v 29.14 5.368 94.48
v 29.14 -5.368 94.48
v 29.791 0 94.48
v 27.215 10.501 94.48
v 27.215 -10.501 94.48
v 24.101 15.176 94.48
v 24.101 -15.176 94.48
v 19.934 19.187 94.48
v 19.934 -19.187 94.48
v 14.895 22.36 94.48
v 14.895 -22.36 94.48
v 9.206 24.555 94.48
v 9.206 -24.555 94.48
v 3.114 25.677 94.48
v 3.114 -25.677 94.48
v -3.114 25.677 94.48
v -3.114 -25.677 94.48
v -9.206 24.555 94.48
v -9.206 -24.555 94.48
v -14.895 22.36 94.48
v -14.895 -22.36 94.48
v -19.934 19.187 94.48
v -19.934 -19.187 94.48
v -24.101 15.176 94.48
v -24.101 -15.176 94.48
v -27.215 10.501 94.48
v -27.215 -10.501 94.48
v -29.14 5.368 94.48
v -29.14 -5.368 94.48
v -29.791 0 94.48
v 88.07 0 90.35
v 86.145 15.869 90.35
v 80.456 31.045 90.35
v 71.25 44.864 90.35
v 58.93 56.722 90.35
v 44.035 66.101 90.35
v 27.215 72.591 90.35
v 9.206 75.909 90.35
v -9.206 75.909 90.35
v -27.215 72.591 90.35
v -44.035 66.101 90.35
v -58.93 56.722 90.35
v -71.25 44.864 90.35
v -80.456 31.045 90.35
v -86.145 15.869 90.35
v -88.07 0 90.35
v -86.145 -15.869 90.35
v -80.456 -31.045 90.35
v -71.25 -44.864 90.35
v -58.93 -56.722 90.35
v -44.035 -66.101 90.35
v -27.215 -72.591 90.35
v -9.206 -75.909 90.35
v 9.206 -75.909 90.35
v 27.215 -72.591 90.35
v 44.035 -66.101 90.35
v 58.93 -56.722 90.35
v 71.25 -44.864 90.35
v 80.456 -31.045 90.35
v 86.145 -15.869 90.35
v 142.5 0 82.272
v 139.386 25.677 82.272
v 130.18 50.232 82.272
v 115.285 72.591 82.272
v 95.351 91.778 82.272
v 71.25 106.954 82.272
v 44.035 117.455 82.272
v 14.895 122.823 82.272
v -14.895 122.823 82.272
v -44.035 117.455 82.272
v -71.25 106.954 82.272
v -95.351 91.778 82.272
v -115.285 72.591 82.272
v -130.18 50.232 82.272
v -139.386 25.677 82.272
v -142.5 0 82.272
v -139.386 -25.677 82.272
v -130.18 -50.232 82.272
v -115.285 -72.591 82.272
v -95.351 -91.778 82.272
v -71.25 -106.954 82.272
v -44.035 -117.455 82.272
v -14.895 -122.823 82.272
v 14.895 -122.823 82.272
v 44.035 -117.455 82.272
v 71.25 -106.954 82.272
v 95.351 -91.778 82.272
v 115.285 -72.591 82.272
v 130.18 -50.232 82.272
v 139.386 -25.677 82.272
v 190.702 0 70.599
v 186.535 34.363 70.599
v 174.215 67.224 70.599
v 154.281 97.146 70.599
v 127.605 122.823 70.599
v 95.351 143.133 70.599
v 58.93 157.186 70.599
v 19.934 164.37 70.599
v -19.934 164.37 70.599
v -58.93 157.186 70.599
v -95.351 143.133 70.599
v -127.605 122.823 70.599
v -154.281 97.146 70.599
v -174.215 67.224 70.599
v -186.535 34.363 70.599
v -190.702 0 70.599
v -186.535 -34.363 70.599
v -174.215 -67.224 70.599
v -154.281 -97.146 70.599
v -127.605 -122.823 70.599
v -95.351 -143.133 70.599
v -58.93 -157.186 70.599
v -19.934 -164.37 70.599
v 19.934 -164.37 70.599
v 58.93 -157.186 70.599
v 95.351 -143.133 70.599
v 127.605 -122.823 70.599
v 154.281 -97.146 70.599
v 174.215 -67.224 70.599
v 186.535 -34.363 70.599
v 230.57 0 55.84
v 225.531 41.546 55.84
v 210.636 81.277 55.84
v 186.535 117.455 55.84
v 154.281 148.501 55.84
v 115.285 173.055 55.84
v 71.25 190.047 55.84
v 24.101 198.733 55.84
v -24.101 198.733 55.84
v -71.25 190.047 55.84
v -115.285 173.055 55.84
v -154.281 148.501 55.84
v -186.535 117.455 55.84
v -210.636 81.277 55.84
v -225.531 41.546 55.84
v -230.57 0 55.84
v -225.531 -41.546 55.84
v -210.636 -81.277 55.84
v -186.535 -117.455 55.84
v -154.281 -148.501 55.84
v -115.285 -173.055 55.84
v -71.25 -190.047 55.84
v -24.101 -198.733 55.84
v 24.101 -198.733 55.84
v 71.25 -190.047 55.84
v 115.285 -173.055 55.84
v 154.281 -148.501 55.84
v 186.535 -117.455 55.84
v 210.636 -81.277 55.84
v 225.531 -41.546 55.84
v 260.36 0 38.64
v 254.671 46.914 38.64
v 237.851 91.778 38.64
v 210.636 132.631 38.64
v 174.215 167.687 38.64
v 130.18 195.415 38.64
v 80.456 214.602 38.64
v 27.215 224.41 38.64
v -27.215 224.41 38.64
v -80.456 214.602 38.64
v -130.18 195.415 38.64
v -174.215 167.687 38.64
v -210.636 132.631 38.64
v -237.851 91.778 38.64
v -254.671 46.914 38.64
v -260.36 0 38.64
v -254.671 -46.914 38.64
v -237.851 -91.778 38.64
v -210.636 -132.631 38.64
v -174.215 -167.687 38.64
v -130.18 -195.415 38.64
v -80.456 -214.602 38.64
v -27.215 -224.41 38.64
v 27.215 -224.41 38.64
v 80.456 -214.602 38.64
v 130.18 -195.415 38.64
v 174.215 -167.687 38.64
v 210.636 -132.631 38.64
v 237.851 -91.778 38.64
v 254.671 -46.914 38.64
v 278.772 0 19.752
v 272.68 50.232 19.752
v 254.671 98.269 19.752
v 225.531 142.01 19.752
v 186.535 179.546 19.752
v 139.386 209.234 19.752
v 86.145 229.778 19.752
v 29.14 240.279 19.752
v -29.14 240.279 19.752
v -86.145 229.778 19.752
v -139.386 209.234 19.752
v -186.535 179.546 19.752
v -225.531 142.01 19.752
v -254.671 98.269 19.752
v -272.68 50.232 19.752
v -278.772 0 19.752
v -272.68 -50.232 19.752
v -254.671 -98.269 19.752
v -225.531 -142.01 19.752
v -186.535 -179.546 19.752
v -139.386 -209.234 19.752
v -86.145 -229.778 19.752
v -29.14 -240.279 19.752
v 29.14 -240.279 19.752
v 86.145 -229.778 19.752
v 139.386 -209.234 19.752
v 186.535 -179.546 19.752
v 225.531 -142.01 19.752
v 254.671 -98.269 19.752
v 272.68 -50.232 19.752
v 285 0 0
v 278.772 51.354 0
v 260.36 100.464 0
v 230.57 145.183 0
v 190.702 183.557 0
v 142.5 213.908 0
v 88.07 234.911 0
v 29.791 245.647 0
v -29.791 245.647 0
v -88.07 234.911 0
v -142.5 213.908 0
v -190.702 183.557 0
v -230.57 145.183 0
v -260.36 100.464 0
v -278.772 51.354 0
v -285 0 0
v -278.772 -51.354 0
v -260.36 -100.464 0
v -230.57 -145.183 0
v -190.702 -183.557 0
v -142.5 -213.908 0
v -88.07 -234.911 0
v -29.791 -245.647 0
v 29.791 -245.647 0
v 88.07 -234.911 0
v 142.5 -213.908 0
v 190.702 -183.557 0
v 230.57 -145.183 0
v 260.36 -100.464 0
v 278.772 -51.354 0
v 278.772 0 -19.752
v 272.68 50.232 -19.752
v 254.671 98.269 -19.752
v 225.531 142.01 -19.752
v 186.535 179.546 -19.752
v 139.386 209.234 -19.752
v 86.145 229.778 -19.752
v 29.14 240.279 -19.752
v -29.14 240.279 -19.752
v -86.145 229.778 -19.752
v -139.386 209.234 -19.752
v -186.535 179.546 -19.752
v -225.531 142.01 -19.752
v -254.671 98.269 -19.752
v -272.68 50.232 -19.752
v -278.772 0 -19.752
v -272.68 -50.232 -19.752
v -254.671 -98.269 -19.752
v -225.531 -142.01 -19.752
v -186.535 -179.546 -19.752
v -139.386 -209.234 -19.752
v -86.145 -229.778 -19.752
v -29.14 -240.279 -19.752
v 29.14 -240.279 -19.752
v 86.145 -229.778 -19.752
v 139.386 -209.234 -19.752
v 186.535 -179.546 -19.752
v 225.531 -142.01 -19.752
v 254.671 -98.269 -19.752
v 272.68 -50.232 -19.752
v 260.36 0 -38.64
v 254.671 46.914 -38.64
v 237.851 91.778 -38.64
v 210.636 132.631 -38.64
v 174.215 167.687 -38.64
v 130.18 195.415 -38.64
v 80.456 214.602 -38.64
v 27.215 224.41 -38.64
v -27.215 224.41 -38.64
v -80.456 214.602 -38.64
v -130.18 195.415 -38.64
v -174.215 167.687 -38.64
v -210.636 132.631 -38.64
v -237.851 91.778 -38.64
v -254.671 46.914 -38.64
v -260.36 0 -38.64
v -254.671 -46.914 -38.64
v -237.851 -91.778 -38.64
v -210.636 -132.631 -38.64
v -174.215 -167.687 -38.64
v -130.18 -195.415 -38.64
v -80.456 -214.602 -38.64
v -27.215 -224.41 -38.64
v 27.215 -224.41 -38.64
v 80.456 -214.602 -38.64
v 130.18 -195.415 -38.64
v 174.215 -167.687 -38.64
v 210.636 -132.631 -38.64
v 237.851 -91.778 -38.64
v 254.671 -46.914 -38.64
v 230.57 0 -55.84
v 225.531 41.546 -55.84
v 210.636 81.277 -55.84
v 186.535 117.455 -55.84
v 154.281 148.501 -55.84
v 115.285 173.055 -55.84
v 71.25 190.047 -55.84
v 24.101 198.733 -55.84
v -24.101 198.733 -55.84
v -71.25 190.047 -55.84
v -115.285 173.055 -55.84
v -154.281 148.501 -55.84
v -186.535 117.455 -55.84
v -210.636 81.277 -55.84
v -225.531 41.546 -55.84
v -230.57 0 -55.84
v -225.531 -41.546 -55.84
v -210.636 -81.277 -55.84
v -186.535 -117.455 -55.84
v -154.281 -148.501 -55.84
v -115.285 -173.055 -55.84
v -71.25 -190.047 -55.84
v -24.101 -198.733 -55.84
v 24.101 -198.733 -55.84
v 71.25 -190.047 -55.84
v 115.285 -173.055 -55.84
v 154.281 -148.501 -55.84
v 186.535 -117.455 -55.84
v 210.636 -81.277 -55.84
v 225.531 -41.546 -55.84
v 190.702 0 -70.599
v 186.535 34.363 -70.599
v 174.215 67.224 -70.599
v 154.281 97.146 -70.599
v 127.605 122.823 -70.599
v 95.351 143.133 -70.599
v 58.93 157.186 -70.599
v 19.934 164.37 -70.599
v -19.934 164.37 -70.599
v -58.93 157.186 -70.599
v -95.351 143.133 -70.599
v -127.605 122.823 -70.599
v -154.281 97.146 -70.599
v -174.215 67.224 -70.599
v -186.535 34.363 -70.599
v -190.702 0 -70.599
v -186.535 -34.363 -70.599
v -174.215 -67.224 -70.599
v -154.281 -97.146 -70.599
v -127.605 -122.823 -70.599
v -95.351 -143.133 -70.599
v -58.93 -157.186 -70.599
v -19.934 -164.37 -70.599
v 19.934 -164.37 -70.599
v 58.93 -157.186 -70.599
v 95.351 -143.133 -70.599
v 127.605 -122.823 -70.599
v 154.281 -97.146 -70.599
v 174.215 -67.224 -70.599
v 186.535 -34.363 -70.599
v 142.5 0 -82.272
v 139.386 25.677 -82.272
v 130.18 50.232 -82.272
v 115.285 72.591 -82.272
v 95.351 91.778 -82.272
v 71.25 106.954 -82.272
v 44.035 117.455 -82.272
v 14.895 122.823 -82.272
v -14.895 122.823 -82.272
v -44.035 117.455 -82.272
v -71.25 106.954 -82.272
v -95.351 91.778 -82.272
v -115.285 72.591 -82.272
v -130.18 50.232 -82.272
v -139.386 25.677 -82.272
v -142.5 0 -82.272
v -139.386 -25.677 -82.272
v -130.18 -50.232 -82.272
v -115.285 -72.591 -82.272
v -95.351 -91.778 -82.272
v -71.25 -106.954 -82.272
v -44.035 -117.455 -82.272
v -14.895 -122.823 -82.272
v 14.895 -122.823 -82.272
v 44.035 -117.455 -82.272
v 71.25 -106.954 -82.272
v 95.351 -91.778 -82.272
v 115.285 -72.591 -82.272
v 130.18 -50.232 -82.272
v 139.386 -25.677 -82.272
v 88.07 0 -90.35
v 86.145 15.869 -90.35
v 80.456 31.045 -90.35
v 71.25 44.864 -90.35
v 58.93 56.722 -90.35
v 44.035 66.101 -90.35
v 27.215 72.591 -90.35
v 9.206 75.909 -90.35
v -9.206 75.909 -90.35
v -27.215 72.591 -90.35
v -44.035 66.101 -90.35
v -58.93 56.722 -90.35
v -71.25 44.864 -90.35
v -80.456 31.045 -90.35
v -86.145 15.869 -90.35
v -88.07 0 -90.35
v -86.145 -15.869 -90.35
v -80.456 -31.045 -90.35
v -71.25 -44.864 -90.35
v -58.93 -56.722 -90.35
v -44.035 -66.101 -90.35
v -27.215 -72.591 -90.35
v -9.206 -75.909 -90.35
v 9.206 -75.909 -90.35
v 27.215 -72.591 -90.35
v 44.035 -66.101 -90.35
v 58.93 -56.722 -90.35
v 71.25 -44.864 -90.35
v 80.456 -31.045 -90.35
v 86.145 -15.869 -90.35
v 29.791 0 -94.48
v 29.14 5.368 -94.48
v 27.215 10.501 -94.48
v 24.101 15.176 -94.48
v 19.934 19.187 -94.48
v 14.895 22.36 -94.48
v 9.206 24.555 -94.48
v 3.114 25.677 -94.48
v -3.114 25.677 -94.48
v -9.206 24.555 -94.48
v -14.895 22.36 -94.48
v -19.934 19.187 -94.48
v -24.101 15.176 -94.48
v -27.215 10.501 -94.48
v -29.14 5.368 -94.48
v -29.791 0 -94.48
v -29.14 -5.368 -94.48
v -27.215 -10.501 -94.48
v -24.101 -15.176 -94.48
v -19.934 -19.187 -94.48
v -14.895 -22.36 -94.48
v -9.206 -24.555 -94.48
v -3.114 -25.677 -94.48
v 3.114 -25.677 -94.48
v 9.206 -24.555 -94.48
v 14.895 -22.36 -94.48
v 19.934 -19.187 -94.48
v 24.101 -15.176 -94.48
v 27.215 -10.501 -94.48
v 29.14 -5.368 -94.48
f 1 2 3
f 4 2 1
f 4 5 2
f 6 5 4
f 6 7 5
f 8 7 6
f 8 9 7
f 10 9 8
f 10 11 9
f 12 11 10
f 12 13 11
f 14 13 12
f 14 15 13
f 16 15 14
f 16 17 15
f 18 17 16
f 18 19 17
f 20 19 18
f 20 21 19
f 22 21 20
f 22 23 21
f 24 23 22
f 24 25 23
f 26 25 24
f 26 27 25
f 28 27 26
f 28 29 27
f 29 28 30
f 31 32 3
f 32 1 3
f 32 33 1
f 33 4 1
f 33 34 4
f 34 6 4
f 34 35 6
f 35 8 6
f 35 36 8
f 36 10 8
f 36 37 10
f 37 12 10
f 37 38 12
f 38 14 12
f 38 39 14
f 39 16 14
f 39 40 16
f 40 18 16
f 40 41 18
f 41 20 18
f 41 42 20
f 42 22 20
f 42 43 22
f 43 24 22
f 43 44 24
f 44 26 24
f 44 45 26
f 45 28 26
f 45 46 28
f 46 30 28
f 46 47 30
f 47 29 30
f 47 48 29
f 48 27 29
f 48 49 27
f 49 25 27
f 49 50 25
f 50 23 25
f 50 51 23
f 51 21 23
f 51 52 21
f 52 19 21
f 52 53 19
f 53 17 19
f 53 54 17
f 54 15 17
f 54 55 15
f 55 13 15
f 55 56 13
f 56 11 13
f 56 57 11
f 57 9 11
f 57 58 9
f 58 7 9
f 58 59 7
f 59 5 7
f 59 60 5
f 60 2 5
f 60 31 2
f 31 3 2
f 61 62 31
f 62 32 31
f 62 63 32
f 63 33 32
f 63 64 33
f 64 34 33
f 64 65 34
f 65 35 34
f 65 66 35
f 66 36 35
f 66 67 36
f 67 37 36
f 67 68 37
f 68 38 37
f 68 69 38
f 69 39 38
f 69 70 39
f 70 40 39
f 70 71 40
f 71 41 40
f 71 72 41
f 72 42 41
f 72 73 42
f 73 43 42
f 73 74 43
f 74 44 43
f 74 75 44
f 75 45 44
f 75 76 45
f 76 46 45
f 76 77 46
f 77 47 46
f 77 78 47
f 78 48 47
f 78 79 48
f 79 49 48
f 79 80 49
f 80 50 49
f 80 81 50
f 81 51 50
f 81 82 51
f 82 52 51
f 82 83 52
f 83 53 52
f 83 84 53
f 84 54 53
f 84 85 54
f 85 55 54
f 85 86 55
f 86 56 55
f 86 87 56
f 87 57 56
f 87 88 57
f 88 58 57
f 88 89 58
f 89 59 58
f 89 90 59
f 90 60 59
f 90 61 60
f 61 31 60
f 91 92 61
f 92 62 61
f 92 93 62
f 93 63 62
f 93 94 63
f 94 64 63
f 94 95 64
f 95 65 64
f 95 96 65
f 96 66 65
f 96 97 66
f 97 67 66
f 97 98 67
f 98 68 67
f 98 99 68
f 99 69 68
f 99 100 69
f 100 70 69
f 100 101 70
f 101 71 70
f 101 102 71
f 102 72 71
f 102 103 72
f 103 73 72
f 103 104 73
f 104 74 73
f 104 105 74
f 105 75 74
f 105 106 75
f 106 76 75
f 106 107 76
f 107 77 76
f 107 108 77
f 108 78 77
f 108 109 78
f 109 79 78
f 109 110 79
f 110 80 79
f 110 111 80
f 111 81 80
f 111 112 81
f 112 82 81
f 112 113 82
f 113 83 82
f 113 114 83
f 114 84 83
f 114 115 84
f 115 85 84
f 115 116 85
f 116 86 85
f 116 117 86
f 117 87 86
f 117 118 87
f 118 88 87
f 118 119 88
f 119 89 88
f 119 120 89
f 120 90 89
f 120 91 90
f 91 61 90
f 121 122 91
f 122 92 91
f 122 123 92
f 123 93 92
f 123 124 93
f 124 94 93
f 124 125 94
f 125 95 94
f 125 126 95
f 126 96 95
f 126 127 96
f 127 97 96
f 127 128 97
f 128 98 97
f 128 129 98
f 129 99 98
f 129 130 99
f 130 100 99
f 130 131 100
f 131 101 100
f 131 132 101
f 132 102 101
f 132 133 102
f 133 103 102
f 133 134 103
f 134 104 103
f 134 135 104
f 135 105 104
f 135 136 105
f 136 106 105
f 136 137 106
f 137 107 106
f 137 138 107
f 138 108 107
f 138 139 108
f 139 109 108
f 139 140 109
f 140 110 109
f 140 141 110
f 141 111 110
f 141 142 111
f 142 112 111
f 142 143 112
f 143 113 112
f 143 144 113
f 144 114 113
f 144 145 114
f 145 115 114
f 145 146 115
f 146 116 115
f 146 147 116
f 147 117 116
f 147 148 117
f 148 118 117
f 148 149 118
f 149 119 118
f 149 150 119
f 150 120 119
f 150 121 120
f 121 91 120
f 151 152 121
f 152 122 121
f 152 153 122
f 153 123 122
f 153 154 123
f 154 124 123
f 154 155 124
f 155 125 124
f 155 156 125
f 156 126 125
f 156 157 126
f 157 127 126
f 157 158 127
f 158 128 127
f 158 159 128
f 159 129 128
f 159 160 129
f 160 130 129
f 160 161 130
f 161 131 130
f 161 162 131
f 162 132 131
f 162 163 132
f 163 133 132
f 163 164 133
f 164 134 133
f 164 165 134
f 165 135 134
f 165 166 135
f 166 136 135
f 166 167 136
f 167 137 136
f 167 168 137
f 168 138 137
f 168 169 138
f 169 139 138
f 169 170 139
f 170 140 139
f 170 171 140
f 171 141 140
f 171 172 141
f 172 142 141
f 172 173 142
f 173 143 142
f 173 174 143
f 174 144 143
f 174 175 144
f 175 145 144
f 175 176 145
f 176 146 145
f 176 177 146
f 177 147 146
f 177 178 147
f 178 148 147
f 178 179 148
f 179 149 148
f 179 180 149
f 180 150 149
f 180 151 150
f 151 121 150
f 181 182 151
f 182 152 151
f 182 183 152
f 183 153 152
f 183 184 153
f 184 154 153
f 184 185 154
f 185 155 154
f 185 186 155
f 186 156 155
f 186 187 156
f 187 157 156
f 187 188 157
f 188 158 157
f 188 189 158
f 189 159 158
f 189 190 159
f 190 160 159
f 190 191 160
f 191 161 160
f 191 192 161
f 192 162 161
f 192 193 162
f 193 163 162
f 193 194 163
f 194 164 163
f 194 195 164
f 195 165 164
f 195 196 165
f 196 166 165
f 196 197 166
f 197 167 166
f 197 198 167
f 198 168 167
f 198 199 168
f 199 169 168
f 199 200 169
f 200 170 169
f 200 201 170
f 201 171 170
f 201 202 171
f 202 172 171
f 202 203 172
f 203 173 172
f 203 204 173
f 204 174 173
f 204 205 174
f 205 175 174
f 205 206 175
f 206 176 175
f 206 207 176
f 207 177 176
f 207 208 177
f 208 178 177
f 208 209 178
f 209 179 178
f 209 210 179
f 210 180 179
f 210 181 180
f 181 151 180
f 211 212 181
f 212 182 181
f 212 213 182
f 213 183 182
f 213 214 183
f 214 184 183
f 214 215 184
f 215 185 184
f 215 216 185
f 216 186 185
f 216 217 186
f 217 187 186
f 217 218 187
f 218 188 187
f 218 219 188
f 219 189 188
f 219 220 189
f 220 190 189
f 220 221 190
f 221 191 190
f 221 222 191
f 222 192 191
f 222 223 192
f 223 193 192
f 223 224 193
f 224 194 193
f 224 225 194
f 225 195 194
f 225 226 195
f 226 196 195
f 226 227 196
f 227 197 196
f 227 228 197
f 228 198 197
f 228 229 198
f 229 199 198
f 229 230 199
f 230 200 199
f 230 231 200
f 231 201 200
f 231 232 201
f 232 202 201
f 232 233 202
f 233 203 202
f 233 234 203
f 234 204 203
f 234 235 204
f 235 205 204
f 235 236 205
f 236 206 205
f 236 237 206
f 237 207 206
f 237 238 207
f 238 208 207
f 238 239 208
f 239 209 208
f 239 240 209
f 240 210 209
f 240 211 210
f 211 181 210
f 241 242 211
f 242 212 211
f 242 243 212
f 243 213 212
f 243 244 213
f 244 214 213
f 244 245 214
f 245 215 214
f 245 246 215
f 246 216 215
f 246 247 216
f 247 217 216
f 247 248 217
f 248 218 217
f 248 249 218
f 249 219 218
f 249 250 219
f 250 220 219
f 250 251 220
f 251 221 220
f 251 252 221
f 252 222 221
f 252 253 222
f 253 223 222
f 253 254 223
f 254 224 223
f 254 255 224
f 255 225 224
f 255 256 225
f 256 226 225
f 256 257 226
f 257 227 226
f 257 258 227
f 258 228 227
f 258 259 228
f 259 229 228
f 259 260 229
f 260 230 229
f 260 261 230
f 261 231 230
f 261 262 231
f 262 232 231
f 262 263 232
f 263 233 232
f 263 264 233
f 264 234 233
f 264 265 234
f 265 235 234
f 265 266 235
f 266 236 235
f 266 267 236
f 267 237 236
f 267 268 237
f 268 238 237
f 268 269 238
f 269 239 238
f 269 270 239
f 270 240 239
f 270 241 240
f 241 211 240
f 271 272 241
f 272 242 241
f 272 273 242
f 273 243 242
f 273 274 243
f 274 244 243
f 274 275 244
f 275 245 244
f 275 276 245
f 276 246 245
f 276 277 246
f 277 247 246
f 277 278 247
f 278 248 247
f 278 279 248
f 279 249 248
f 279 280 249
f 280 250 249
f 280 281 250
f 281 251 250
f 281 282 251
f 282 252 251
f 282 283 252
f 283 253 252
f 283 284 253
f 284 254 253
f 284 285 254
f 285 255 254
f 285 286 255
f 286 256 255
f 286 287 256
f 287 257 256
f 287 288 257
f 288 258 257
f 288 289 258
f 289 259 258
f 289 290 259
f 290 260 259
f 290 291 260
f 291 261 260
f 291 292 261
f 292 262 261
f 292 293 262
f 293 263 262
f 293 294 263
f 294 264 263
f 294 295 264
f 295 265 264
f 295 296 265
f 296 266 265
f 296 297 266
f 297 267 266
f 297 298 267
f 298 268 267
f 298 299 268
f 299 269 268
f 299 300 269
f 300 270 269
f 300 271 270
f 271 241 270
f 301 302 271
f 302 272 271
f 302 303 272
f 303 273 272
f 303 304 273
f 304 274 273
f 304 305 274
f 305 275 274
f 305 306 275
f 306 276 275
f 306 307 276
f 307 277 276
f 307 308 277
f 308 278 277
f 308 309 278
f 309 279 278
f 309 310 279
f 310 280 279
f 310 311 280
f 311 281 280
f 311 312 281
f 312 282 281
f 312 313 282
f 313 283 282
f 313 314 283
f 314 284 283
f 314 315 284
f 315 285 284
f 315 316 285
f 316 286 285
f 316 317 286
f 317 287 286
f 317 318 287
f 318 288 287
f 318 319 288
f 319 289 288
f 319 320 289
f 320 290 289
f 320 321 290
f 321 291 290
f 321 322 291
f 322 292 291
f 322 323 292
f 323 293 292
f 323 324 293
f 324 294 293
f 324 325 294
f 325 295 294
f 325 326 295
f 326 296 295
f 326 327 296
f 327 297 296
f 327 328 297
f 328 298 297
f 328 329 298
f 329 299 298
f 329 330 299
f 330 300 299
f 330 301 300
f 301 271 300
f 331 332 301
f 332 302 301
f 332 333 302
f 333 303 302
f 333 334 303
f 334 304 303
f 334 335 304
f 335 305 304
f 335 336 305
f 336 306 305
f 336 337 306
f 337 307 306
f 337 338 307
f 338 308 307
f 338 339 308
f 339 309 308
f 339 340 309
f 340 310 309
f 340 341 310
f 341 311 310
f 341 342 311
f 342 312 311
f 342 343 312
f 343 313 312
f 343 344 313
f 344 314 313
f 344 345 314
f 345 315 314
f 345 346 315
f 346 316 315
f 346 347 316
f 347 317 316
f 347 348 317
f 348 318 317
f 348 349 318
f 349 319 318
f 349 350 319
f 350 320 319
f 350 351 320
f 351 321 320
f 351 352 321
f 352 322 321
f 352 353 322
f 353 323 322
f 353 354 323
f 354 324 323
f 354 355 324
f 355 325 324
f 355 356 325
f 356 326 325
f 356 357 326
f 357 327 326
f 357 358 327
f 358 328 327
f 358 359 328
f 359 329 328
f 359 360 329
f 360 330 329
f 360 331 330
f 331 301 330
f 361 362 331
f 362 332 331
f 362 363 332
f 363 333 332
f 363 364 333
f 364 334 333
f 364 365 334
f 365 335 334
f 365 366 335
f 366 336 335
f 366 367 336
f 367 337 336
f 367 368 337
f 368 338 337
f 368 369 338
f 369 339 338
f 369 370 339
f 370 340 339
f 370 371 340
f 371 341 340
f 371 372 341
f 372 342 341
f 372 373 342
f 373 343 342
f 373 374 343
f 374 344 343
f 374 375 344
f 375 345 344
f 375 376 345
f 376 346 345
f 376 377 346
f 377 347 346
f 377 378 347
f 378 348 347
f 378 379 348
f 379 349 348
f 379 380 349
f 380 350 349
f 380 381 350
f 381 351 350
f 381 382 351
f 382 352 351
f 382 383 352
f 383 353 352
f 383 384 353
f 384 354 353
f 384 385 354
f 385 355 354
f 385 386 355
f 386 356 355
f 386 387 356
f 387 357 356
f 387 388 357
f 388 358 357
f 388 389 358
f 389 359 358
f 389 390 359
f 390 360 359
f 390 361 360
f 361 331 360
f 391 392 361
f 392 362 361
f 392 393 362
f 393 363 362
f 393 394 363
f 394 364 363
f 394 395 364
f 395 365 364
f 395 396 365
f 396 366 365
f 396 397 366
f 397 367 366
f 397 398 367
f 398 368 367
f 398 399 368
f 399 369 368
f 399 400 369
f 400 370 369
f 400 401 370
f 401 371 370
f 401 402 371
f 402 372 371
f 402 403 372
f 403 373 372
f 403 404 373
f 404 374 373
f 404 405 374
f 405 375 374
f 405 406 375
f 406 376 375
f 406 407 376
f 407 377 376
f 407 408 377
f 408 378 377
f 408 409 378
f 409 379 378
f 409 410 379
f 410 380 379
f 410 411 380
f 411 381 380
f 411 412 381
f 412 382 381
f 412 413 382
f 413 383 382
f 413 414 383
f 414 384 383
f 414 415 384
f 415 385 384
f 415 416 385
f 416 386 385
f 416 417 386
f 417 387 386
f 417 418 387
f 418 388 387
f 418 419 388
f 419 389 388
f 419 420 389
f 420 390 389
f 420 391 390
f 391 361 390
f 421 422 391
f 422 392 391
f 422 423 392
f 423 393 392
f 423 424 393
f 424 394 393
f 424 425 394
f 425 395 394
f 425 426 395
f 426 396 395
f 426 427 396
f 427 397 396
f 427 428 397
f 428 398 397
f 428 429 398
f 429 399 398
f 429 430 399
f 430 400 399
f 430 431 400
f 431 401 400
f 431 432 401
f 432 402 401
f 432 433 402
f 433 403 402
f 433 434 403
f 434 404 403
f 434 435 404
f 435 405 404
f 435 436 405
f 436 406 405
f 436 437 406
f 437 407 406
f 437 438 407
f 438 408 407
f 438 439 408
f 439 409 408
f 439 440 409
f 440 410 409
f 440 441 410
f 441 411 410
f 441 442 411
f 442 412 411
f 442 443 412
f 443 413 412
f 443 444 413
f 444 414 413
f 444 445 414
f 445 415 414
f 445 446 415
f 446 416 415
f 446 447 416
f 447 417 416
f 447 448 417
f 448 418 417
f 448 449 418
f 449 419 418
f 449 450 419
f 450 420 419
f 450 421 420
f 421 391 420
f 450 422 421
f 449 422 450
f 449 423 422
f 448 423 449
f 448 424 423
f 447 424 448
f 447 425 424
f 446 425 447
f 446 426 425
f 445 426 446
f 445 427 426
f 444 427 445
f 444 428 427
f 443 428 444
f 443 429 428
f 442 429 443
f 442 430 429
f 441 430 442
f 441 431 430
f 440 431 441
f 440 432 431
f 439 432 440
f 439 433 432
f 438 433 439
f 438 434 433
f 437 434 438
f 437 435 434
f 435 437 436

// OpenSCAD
// Generated by SolidPython 1.0.1 on 2020-07-29 00:46:52


scale(v = [15, 13, 5]) {
	sphere(r = 19);
}
/***********************************************
*********      SolidPython code:      **********
************************************************
 
# import packages: SolidPython
from solid import *
from solid.utils import *
from itertools import chain, combinations, permutations


class Resize:

    def __init__(self, scad_file):
        self.scad_file = scad_file
        #self.scad_file = import_scad(scad_file)
        # cone/cylinder param:
        self.r1 = 0
        self.r2 = 0
        self.h = 0
        # rectangular prism param:
        self.w = 0
        self.l = 0
        # ellipse param:
        self.r = 0

    # import OpenScad code (file name corresponds to shape)


    # classify shape + parameters
    def assign(self, param1, param2, param3):
        if self.scad_file == 'cone.scad':
            self.r1 = param1
            self.r2 = param2
            self.h = param3
        elif self.scad_file == 'cylinder.scad':
            self.r1 = param1
            self.r2 = param2
            self.h = param3
        elif self.scad_file == 'rectangularPrism.scad':
            self.h = param1
            self.l = param2
            self.w = param3
        else:
            self.r = param1
            self.h = param2

    # resize parameters
    def iterate(self):
        x = range(3, 20, 2)
        i = 1
        if self.scad_file == 'cone.scad':
            tempList = list(permutations(x, 2))
            for temp in tempList:
                param1 = temp[0]
                param2 = temp[1]
                filepath = 'produced_scad_files/' + 'cone' + str(param1) + '_' + str(param2) + '_' + '.scad'
                scad_render_to_file(cylinder(h=param1, r1=param2, r2=0), filepath)

        elif self.scad_file == 'cylinder.scad':
            tempList = list(permutations(x, 3))
            for temp in tempList:
                param1 = temp[0]
                param2 = temp[1]
                filepath = 'produced_scad_files/' + 'cylinder' + str(param1) + '_' + str(param2) + '_' + '.scad'
                scad_render_to_file(cylinder(h=param1, r1=param2, r2=param2), filepath)

        elif self.scad_file == 'rectangularPrism.scad':
            tempList = list(permutations(x, 3))
            for temp in tempList:
                param1 = temp[0]
                param2 = temp[1]
                param3 = temp[2]
                filepath = 'produced_scad_files/' + 'rectangularPrism' + str(param1) + '_' + str(param2) + '_' + str(
                    param3) + '.scad'
                scad_render_to_file(cube(size=(param1, param2, param3)), filepath)

        elif self.scad_file == 'ellipse.scad':
            tempList = list(permutations(x, 4))
            for temp in tempList:
                param1 = temp[0]
                param2 = temp[1]
                param3 = temp[2]
                param4 = temp[3]
                filepath = 'produced_scad_files/' + 'ellipse' + str(param1) + '_' + str(param2) + '_' + str(param3) + '_' + str(param4) + '.scad'
                scad_render_to_file(scale([param1, param2, param3])(sphere(r=param4)), filepath)

    def render_to_scadfile(self):
        scad_render_to_file(scad, 'example.scad') 
 
************************************************/
